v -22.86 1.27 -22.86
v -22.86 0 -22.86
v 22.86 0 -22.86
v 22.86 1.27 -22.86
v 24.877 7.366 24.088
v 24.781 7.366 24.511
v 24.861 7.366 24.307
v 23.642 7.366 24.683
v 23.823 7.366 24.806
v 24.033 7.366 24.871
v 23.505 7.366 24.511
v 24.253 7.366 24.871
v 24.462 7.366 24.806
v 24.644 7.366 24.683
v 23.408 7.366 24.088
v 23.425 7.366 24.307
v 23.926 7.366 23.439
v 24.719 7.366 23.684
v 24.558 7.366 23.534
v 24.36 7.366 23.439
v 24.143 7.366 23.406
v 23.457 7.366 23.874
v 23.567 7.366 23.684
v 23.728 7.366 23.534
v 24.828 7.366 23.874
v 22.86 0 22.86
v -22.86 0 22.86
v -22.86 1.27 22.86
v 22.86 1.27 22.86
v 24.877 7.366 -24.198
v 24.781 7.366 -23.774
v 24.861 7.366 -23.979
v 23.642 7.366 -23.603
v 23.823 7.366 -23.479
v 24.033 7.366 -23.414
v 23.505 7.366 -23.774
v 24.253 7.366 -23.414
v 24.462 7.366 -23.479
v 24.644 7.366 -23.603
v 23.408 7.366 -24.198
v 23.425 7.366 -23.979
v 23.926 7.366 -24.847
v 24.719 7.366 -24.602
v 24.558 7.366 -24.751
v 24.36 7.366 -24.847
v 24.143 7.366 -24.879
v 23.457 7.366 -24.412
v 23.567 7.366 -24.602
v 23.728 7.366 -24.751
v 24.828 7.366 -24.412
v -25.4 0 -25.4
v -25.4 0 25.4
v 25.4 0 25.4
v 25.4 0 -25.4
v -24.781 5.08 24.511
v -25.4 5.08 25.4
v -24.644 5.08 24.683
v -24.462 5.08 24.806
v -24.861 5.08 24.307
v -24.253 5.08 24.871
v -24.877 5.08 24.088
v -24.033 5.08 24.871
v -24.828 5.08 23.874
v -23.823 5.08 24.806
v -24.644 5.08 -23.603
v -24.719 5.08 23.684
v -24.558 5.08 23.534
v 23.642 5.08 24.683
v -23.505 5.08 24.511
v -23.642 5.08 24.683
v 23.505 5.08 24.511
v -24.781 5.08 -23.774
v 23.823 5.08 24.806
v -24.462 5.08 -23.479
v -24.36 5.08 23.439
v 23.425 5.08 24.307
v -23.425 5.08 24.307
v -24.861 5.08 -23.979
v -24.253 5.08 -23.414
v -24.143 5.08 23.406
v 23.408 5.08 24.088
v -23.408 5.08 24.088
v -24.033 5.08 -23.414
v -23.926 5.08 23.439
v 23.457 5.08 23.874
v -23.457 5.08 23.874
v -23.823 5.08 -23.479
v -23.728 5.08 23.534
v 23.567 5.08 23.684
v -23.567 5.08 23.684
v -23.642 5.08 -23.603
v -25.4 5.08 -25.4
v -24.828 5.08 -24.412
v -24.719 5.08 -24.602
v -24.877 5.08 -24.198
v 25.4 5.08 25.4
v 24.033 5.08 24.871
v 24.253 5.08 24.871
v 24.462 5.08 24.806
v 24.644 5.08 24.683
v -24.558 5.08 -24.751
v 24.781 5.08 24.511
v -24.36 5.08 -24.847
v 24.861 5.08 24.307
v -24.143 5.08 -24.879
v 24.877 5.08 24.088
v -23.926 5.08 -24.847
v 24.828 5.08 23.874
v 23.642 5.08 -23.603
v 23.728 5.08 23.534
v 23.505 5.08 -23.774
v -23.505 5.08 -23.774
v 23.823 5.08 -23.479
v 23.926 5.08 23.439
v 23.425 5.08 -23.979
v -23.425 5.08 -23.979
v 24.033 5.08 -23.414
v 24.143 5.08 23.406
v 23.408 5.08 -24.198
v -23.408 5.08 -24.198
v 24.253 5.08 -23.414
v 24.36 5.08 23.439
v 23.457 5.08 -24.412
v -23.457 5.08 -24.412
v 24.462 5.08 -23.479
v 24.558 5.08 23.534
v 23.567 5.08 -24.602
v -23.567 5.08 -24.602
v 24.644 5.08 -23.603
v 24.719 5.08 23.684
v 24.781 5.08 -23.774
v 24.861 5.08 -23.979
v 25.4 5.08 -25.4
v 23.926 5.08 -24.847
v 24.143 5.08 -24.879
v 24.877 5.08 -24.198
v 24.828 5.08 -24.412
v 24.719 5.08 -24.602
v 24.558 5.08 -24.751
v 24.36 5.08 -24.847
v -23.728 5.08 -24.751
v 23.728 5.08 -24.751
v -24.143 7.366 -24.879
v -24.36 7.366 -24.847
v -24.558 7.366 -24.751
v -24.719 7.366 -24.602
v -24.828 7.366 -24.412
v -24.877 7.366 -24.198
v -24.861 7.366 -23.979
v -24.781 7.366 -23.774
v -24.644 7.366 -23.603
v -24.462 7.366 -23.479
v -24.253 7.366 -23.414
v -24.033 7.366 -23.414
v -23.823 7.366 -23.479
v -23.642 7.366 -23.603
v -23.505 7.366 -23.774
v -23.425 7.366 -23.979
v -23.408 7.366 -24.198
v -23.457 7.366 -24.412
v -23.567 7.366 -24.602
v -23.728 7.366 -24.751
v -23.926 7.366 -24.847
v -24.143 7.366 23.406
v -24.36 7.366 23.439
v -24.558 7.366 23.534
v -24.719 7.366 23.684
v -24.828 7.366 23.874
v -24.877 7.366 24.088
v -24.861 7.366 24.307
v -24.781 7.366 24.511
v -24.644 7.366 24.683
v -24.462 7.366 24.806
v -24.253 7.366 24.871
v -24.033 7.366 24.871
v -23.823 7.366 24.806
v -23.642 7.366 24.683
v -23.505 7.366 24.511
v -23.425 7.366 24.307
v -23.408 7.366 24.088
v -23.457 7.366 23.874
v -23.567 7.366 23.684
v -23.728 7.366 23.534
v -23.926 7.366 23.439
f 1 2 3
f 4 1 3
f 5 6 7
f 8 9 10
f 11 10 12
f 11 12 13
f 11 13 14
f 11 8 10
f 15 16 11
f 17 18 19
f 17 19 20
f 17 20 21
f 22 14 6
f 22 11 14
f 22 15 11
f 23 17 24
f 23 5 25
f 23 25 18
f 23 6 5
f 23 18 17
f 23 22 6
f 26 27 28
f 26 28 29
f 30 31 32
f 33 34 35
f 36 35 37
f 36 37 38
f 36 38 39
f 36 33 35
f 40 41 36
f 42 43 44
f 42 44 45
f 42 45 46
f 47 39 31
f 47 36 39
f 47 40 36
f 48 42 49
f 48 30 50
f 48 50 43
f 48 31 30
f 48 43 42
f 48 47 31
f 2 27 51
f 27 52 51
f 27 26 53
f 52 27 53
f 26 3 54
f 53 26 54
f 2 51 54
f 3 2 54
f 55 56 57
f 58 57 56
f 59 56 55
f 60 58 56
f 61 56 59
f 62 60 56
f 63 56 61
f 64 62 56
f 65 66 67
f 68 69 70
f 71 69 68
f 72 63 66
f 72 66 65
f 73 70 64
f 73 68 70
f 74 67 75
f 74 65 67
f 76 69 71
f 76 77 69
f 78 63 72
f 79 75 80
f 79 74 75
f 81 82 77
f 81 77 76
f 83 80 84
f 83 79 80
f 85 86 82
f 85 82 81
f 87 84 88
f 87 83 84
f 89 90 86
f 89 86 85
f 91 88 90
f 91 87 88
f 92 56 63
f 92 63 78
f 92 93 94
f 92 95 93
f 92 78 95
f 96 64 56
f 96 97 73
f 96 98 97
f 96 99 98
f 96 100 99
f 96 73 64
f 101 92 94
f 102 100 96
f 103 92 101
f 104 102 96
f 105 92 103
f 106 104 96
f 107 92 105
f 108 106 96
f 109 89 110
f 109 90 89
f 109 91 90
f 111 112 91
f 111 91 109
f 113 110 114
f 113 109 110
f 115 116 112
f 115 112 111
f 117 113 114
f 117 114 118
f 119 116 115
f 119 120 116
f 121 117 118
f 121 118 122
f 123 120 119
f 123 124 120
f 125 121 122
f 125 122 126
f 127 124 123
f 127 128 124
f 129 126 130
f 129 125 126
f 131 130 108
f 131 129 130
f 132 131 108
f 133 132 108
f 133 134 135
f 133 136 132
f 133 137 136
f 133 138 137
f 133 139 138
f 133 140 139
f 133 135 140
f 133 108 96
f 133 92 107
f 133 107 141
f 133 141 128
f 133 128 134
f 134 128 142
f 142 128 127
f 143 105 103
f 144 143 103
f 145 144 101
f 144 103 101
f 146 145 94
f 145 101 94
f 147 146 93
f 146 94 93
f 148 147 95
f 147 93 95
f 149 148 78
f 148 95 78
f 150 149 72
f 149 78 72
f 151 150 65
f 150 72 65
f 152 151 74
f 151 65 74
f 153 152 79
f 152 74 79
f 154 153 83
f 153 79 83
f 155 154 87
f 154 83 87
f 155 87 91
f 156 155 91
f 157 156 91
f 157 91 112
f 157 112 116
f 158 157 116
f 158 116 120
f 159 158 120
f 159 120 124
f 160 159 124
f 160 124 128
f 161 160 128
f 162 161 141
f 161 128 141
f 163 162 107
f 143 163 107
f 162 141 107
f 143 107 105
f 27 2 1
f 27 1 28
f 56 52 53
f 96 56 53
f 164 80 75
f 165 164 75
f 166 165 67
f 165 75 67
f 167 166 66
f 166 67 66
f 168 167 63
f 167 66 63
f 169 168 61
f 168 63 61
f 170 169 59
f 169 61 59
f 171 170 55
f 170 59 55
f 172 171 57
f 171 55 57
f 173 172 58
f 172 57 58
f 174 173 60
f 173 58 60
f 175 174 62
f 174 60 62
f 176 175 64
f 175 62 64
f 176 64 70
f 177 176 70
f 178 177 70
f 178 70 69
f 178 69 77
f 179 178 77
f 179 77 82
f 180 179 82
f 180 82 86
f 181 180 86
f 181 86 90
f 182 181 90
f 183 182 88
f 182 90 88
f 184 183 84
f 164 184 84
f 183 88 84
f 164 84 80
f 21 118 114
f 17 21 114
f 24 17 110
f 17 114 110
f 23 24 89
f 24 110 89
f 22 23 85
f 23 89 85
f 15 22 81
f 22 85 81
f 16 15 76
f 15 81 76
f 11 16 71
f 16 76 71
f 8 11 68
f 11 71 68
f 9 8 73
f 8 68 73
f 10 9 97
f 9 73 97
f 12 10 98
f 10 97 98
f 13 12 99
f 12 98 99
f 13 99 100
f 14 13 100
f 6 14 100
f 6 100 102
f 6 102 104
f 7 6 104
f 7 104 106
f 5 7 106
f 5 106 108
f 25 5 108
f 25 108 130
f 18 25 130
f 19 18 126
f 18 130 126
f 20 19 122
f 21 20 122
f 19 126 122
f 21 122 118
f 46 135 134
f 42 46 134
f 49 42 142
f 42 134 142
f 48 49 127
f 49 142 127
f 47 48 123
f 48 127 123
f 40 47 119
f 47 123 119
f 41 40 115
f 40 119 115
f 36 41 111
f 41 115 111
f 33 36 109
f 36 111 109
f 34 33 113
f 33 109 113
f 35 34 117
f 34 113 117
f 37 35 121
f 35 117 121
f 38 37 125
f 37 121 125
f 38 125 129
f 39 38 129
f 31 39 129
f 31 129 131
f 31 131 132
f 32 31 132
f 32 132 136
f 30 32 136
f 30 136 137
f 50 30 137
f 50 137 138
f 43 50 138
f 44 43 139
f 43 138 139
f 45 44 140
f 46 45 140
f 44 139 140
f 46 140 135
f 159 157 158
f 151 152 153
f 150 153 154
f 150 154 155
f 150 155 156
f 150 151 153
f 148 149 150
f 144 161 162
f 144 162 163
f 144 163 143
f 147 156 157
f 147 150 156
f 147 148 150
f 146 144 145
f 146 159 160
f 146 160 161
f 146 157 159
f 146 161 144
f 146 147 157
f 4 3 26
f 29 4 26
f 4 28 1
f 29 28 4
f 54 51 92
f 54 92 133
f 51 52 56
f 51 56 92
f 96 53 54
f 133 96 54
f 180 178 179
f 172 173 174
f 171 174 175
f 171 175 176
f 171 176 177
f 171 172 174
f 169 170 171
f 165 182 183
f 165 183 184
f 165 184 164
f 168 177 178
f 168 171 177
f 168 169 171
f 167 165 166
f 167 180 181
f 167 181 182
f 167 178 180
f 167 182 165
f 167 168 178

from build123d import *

# Parameters (mm, degrees)
SKETCH1_W           = 50.8
SKETCH1_H           = 50.8
BOSS_EXTRUDE1_DEPTH = 5.08
SKETCH11_R          = 0.7366
BOSS_EXTRUDE2_DEPTH = 2.286
SKETCH12_W          = 45.72
SKETCH12_H          = 45.72
CUT_EXTRUDE1_DEPTH  = 1.27


with BuildPart() as part:
    # Sketch1 → Boss-Extrude1 (new body)
    with BuildSketch(Plane(origin=(0, 0, 0), x_dir=(1, 0, 0), z_dir=(0, 1, 0))):
        Rectangle(SKETCH1_W, SKETCH1_H)
    extrude(amount=BOSS_EXTRUDE1_DEPTH)

    # Sketch11 → Boss-Extrude2 (add)
    with BuildSketch(Plane(origin=(0, 5.08, 0), x_dir=(1, 0, 0), z_dir=(0, 1, 0))):
        with Locations(Location((-24.142764143, 24.142764143, 0), (0, 0, 90))):
            Circle(SKETCH11_R)
        with Locations(Location((24.142764143, 24.142764143, 0), (0, 0, 90))):
            Circle(SKETCH11_R)
        with Locations(Location((24.142764143, -24.142764143, 0), (0, 0, 90))):
            Circle(SKETCH11_R)
        with Locations(Location((-24.142764143, -24.142764143, 0), (0, 0, 90))):
            Circle(SKETCH11_R)
    extrude(amount=BOSS_EXTRUDE2_DEPTH)

    # Sketch12 → Cut-Extrude1 (cut)
    with BuildSketch(Plane.XZ):
        Rectangle(SKETCH12_W, SKETCH12_H)
    extrude(amount=-CUT_EXTRUDE1_DEPTH, mode=Mode.SUBTRACT)


solid = part.part
